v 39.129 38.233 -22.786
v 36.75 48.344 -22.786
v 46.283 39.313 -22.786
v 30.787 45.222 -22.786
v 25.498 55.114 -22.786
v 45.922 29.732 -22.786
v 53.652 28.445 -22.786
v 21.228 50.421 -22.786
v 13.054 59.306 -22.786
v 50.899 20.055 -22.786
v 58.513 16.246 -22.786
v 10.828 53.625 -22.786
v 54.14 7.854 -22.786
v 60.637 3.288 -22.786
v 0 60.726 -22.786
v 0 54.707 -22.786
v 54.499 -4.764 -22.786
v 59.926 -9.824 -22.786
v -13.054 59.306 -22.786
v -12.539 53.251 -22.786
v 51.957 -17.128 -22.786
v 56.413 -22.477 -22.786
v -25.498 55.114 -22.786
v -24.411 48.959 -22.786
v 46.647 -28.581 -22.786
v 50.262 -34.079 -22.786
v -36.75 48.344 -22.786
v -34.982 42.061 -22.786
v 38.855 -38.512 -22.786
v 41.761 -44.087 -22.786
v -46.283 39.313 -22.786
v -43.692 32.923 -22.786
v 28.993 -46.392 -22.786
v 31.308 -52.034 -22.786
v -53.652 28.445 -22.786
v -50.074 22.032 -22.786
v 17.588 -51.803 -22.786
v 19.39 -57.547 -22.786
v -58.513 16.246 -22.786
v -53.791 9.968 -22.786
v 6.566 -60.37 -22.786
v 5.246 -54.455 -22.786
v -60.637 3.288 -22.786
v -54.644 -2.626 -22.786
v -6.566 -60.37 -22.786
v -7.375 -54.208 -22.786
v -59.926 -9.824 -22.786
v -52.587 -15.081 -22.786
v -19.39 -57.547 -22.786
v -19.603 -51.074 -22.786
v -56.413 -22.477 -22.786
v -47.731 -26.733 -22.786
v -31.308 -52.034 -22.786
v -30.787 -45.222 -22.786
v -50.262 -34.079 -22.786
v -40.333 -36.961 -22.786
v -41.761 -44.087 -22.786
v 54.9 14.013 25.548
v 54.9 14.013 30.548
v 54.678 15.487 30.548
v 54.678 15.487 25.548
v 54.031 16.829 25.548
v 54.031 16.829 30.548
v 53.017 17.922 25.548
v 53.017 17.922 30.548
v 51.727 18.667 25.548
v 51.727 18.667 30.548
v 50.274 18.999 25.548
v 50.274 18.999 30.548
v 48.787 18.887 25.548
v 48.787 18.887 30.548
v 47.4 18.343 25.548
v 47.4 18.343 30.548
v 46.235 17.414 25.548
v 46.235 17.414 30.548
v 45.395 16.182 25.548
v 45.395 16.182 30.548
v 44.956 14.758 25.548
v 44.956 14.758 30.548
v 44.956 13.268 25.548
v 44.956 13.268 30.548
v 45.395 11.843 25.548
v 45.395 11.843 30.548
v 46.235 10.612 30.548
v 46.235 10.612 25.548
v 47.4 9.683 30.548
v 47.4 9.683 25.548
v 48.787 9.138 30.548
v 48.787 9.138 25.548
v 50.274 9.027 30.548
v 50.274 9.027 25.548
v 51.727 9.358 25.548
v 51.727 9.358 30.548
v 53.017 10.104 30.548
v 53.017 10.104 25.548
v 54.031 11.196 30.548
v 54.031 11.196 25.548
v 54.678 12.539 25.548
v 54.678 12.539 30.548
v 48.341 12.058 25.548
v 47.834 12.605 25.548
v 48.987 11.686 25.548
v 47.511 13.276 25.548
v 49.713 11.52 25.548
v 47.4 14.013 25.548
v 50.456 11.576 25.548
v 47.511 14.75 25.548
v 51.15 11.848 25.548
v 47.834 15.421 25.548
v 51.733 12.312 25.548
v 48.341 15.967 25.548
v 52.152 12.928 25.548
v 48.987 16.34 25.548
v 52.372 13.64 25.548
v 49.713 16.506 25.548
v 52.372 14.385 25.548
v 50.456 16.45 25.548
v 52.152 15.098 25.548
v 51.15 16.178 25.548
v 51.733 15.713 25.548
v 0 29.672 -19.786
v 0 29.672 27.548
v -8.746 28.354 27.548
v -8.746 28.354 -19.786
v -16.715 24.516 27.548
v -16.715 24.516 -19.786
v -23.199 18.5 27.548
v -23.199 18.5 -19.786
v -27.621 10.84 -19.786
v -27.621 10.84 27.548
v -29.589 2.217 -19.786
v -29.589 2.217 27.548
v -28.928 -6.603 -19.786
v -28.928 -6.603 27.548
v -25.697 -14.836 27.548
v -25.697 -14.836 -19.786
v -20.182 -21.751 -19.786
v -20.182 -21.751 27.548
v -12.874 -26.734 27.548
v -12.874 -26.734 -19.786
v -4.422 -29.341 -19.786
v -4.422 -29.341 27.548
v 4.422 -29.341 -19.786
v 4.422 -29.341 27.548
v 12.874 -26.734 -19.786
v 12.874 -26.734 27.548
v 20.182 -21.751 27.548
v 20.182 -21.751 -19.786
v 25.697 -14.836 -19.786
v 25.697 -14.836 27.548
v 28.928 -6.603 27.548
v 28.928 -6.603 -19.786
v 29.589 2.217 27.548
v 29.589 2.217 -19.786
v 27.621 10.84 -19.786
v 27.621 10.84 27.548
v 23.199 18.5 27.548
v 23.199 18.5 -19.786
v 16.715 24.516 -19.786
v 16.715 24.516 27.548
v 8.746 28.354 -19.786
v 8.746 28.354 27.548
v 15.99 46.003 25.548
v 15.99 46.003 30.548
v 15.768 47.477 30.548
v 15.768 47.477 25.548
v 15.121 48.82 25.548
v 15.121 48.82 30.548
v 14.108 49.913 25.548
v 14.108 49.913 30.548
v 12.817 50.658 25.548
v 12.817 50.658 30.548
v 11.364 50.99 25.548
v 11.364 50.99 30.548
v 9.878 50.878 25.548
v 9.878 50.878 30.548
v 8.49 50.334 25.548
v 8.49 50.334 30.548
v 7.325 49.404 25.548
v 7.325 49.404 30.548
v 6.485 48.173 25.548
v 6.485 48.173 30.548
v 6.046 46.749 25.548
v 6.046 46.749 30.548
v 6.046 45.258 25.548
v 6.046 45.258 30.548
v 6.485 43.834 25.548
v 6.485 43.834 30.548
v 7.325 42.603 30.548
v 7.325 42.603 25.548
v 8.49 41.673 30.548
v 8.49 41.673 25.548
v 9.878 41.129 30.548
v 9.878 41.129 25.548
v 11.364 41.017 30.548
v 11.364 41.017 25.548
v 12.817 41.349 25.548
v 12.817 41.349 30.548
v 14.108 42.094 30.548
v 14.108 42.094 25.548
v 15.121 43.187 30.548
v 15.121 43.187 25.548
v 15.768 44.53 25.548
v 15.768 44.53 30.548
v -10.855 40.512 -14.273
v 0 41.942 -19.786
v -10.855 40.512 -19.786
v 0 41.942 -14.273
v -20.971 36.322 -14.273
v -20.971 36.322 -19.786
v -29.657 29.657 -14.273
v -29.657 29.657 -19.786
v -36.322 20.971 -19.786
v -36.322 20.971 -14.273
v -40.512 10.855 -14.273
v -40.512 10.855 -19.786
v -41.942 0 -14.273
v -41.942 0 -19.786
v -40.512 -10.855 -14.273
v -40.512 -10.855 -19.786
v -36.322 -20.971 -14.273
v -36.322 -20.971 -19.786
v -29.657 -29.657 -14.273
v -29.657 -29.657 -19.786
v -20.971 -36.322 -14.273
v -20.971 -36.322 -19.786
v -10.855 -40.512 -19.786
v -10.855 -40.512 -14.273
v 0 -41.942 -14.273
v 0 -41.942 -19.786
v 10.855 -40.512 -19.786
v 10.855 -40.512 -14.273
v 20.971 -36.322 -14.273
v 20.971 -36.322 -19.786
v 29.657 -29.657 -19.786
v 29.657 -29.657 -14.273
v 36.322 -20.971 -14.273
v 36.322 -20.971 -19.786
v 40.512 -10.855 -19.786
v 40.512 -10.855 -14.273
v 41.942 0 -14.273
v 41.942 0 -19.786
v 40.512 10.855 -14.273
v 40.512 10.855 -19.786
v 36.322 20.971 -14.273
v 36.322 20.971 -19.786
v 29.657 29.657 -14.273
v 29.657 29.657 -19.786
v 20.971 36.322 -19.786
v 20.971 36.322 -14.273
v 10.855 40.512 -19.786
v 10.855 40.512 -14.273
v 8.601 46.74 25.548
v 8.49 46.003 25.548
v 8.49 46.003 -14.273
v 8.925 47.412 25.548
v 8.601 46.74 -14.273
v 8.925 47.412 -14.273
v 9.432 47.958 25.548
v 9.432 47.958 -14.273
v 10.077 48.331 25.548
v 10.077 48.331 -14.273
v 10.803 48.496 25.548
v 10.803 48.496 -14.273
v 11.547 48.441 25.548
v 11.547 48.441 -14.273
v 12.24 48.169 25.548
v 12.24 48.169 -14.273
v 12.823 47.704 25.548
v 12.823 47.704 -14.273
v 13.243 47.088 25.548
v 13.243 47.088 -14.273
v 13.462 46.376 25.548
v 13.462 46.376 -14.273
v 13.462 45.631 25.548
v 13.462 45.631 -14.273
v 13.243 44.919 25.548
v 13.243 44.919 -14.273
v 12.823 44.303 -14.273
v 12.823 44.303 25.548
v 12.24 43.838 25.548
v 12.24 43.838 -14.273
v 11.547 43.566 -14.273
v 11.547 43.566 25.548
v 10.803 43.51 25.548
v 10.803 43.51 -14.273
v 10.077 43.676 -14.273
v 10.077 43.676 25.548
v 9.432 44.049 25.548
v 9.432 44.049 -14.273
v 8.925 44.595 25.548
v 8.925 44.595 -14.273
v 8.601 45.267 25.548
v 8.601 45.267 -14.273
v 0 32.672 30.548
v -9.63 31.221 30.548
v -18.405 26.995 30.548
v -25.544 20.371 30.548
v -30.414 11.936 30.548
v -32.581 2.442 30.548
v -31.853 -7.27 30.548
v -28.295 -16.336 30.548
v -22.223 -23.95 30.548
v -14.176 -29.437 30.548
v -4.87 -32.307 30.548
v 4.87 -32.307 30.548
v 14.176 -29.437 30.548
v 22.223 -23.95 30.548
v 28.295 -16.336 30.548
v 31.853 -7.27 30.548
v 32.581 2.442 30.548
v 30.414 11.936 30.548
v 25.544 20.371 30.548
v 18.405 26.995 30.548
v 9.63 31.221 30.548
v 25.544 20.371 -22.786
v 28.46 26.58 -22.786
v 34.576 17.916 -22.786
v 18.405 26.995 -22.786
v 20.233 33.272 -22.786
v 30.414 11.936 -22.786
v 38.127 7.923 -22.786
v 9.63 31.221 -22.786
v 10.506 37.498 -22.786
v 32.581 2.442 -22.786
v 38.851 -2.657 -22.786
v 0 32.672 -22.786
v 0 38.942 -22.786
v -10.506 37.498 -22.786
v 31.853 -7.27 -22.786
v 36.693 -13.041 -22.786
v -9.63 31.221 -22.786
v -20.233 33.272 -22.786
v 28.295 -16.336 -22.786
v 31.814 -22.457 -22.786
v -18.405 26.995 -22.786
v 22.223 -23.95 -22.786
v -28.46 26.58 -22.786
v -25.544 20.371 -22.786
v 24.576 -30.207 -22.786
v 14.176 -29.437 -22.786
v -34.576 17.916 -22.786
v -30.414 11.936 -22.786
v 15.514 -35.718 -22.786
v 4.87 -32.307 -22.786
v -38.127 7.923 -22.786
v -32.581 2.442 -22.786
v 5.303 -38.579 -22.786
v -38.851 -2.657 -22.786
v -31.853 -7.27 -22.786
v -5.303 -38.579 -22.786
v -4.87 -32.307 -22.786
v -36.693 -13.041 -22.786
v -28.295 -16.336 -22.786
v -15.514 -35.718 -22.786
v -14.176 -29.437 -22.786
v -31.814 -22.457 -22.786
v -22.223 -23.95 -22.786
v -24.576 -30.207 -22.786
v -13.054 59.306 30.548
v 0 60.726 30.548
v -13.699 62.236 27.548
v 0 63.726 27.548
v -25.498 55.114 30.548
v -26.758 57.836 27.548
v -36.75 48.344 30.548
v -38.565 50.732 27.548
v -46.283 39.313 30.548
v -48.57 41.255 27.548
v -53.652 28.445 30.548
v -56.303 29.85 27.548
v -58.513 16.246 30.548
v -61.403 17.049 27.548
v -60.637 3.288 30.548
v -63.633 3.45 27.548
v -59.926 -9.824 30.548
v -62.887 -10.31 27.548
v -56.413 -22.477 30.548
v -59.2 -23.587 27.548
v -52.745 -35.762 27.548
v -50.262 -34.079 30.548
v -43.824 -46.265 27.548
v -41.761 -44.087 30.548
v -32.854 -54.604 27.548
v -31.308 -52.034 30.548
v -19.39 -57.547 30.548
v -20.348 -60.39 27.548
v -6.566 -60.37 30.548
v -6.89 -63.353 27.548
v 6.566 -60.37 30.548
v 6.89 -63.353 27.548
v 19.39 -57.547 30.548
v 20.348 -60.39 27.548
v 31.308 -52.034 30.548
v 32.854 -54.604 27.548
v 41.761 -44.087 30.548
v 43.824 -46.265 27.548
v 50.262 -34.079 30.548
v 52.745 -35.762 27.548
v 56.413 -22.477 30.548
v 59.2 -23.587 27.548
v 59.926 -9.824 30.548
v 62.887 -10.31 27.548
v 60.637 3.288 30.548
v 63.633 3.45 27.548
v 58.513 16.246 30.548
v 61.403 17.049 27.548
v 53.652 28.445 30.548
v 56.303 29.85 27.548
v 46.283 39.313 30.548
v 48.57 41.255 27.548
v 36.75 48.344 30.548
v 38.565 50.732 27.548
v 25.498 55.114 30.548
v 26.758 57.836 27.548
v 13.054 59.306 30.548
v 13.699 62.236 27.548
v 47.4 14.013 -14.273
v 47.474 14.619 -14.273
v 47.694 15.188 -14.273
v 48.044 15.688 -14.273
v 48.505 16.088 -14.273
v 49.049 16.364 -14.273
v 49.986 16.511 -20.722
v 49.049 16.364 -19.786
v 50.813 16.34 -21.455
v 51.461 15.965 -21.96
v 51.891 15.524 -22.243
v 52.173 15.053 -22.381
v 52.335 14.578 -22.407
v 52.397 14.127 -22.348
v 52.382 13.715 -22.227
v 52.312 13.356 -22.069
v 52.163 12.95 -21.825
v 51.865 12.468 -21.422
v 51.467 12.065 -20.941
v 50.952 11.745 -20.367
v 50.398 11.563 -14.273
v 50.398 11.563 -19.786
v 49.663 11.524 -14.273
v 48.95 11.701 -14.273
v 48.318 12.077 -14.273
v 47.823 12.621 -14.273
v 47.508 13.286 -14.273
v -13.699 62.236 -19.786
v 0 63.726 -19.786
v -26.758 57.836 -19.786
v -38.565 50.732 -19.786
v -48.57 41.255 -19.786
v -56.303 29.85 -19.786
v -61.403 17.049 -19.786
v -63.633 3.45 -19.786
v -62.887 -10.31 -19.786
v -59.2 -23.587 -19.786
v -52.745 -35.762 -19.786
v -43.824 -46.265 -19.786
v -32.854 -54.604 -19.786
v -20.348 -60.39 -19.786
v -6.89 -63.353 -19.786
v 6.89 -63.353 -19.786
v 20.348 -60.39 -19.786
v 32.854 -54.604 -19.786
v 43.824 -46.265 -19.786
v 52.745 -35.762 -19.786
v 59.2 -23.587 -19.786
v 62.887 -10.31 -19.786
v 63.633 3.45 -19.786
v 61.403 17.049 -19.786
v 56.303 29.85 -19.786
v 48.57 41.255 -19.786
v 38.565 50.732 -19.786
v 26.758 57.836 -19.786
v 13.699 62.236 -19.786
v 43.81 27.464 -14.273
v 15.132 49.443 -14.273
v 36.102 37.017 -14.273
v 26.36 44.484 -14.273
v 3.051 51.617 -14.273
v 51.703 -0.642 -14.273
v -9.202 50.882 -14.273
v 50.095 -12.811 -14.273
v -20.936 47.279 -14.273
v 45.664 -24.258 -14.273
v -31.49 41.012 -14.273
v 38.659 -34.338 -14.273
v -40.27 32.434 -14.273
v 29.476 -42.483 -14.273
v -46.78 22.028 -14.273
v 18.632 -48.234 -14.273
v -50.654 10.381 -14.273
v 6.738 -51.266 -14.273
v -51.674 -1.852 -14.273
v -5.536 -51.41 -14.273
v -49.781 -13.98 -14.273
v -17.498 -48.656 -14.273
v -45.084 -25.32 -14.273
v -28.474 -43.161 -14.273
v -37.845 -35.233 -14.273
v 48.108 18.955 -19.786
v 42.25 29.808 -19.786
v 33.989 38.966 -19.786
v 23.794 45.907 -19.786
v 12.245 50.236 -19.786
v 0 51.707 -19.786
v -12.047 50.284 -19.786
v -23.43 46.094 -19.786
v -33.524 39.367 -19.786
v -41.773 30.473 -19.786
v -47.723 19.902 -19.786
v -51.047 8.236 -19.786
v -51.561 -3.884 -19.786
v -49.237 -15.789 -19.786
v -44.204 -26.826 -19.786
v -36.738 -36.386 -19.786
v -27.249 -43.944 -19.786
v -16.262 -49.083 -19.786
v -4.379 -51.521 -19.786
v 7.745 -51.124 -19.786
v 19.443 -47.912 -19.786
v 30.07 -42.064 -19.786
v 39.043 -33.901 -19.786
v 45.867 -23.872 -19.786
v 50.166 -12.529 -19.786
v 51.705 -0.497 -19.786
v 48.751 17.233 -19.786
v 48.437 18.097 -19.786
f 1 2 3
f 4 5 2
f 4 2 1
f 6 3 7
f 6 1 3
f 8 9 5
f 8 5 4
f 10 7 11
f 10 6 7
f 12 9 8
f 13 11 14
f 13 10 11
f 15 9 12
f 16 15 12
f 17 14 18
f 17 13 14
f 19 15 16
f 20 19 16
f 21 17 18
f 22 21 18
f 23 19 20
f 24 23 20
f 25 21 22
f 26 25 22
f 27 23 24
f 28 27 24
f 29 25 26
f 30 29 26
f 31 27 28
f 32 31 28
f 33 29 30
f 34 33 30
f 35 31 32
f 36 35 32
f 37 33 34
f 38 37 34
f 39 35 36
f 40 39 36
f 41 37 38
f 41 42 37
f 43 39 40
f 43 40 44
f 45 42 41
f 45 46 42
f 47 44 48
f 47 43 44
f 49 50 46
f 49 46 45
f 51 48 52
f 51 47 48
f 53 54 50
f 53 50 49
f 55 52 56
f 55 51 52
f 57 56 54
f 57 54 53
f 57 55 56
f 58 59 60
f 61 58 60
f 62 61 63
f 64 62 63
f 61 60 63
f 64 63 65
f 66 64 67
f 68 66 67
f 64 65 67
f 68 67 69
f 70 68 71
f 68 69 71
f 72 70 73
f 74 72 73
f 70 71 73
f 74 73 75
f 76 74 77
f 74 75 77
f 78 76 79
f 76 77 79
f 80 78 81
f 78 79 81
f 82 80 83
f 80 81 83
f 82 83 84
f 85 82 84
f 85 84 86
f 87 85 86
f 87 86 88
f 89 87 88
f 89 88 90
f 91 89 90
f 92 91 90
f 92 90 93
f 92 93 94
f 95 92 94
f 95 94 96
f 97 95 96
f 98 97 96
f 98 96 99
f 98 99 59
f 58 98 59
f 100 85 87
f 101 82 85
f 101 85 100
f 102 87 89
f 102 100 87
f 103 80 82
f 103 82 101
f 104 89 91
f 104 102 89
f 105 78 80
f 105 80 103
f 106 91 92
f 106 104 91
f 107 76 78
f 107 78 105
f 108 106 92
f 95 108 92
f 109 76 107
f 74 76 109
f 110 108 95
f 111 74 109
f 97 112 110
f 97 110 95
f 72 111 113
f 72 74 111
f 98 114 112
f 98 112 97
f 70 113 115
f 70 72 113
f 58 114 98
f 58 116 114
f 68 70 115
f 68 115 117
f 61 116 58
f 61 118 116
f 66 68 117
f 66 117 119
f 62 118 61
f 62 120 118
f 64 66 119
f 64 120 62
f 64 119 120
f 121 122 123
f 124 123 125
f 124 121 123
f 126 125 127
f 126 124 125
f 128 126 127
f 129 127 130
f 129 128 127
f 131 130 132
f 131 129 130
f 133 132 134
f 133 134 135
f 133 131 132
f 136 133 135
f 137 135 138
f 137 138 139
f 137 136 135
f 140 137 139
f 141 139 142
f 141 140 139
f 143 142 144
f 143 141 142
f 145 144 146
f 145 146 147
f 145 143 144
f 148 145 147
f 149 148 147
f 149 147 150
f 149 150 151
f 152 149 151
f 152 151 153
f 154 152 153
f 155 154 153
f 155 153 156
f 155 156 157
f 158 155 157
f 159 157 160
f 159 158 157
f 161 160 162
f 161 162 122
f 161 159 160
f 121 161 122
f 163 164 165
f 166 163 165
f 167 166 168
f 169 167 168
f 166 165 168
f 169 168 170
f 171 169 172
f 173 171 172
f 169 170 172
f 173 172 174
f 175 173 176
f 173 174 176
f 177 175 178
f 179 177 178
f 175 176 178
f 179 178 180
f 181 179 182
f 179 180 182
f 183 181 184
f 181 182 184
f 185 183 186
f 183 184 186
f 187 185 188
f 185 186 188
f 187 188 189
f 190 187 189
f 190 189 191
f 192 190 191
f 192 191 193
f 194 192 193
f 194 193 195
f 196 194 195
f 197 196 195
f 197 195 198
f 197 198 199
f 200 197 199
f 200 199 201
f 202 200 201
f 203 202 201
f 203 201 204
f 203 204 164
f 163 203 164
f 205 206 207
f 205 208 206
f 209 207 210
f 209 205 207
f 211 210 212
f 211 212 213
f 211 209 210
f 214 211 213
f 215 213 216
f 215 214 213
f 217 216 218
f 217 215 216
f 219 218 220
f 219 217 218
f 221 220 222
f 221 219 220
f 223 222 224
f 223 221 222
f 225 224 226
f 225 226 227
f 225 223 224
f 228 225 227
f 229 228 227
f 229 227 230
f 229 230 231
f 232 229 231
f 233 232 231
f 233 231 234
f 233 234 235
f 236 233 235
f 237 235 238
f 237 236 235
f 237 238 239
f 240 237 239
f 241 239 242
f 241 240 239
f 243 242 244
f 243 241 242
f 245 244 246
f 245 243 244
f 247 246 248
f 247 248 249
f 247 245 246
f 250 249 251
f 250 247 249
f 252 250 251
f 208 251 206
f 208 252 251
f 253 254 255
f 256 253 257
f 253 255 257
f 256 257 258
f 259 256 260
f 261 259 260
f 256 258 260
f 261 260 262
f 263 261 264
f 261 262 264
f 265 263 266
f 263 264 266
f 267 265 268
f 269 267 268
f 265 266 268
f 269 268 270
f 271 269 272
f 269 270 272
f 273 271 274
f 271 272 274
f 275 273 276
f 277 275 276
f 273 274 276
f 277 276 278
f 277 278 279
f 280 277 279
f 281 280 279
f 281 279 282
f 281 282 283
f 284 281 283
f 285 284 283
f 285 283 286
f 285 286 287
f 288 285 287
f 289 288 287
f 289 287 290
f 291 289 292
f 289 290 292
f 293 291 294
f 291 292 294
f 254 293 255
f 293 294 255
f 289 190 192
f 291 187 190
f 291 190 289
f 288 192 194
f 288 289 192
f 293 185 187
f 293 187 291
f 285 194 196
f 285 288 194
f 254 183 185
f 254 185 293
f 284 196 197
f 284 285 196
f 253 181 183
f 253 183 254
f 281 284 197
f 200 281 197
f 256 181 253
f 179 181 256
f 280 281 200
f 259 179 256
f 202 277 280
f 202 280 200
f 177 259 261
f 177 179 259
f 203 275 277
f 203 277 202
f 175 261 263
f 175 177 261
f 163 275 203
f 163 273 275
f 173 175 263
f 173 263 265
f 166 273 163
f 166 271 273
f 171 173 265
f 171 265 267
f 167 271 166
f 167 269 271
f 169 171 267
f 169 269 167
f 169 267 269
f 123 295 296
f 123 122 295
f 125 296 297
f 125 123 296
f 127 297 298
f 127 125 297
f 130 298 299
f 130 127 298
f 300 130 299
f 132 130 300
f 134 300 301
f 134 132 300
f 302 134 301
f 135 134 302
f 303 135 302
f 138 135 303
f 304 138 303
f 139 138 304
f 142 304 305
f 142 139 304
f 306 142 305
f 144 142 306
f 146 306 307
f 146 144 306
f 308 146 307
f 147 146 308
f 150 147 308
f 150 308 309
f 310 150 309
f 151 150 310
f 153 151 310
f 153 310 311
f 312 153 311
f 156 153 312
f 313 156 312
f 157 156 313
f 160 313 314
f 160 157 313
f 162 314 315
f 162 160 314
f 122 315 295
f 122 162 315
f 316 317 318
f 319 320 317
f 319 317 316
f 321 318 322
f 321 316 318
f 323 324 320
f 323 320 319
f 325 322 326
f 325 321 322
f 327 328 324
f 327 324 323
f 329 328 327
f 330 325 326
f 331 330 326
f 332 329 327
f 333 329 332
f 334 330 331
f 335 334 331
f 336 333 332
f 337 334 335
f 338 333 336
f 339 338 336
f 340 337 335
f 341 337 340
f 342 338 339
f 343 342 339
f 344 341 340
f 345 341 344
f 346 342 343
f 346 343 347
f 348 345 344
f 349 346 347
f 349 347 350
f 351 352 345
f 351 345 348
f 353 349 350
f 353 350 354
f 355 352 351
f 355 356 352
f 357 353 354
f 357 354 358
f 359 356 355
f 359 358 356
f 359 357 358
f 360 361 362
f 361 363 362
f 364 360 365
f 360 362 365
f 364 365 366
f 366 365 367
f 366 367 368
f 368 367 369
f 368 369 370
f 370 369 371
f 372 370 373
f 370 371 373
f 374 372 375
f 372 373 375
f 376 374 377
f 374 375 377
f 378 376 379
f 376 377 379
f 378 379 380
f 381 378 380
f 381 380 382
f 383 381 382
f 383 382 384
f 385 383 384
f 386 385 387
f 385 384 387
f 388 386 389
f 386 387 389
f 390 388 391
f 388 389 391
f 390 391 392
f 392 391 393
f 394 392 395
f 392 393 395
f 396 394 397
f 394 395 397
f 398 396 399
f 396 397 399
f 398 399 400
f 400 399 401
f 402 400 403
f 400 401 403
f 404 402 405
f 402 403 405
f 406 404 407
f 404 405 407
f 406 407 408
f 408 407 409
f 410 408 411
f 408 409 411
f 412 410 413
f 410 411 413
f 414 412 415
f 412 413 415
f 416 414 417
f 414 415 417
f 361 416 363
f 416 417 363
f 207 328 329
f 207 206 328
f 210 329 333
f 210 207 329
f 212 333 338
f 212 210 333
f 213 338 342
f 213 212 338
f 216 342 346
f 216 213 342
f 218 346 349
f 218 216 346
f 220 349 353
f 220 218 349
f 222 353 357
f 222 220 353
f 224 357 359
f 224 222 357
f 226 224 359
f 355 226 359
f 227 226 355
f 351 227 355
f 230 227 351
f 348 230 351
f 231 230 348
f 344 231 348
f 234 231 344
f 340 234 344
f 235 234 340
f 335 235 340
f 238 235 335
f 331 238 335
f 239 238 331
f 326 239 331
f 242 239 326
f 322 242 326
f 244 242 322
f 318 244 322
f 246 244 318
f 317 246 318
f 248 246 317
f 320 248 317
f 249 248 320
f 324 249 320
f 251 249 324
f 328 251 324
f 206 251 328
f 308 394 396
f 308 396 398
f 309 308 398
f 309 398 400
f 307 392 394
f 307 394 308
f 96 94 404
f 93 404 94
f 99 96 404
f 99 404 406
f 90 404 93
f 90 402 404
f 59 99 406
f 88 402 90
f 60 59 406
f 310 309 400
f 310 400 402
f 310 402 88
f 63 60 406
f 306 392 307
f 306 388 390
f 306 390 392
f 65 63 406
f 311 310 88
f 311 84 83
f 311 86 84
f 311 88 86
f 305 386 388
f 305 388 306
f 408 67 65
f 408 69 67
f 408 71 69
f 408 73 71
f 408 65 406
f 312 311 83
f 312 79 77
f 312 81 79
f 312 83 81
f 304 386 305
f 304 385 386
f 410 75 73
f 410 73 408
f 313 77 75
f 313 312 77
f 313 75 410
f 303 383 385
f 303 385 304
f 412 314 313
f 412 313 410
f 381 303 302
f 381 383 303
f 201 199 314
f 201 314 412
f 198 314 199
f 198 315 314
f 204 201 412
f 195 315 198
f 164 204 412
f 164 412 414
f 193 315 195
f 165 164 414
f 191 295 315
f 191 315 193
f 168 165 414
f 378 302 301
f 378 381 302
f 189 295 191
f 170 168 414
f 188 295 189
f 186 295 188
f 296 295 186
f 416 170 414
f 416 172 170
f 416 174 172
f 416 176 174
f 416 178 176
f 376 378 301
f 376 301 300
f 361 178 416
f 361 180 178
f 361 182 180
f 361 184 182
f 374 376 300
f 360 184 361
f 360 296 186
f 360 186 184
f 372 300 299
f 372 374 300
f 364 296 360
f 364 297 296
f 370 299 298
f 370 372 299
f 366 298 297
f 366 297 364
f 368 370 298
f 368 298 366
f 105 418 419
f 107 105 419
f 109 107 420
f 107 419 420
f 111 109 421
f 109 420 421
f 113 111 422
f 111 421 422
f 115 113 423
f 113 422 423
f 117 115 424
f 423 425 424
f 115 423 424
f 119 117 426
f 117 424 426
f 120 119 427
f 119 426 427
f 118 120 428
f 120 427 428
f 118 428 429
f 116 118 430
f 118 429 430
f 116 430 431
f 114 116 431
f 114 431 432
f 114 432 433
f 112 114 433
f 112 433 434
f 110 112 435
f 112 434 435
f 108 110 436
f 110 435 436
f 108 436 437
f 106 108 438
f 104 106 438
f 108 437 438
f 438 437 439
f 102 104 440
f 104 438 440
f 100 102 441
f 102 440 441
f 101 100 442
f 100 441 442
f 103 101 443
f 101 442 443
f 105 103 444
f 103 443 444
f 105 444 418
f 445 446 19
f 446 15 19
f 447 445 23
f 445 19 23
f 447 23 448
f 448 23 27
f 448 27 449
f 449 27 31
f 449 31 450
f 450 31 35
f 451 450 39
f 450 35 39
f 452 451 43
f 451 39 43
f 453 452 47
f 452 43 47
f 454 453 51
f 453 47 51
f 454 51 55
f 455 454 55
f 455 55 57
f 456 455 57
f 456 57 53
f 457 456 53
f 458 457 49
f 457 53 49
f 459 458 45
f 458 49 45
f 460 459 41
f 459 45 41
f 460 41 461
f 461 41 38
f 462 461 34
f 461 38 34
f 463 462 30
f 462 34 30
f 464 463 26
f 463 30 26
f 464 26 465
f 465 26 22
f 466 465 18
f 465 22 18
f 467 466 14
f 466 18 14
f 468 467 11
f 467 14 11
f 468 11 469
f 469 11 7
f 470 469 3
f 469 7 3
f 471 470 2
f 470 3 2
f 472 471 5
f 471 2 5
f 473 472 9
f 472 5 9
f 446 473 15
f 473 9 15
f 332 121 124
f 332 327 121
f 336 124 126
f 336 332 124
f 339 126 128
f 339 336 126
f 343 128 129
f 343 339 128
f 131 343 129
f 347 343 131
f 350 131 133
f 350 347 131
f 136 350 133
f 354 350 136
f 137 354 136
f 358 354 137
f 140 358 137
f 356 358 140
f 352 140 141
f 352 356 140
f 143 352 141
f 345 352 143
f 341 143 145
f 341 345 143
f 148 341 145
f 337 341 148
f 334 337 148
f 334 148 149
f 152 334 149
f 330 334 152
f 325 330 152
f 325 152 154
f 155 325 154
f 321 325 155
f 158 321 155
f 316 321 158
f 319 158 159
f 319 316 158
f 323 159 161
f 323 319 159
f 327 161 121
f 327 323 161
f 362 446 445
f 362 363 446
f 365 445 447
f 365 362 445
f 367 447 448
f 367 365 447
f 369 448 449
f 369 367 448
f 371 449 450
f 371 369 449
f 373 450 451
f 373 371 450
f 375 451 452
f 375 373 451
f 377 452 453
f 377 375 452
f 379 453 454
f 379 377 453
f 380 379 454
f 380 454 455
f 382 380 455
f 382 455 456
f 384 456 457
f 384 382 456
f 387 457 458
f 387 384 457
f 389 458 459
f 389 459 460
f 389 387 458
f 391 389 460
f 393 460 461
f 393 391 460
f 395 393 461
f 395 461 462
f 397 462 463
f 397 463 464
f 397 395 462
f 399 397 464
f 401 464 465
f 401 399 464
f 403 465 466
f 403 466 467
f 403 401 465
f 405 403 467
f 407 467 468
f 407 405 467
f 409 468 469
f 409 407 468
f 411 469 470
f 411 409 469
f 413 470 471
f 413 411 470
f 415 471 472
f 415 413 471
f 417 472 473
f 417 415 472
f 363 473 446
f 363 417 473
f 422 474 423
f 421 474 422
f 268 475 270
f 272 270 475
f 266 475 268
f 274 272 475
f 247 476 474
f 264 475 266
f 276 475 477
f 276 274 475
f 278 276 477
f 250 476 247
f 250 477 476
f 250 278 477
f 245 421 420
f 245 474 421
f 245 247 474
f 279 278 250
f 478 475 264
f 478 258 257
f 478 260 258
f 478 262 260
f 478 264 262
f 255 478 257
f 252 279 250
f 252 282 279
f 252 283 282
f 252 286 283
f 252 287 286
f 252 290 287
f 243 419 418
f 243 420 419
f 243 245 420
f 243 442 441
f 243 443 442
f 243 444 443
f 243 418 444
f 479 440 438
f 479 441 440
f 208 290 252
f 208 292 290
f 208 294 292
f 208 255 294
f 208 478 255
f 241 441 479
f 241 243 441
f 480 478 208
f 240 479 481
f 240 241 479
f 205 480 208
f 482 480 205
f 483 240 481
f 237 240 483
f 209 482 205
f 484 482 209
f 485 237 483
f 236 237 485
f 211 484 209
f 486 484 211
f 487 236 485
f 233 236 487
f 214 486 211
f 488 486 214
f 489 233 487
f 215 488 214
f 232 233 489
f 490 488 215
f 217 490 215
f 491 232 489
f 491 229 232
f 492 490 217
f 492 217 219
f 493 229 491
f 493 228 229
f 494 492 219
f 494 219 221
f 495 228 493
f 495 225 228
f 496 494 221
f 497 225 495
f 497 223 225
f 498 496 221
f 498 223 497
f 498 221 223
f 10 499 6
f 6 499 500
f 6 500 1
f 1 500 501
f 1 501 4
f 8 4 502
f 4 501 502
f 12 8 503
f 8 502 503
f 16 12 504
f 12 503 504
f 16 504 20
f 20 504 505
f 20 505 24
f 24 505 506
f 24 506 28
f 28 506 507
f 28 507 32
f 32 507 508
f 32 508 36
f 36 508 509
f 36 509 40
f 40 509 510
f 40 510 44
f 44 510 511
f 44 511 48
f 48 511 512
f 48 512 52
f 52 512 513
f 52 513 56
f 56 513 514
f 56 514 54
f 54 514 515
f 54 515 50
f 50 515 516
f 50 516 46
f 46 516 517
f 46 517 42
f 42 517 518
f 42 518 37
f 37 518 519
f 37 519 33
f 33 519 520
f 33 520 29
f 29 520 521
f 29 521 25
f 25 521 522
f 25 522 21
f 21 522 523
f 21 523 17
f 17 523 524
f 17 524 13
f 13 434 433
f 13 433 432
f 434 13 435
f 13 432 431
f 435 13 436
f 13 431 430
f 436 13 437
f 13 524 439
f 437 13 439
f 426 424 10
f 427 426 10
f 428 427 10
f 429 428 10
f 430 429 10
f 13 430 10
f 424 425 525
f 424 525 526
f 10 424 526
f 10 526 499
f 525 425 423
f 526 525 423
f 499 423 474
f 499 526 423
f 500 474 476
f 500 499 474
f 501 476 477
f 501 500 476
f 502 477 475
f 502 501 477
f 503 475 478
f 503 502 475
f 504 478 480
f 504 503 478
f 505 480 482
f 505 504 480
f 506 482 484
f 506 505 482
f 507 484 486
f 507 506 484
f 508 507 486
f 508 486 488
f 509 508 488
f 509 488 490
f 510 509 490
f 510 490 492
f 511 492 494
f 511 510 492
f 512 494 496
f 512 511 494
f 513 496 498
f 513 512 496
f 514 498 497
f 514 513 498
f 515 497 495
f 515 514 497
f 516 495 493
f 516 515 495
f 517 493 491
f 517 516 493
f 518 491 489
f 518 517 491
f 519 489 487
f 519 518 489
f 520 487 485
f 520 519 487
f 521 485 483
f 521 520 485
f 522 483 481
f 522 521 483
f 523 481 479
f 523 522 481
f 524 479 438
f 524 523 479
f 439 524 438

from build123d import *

# Parameters (mm, degrees)
F3_D           = 5
F3_CBORE_D     = 10
F3_CBORE_DEPTH = 5
F4_T6_ANGLE    = 291.5048547237
F4_T14_ANGLE   = 80.1015252238


# Not quite as in the source:
# - a fillet or chamfer that OpenCascade refuses, or shapes differently, is made with other operations: its cross-section is extruded or revolved along the edge and cut away or added


with BuildPart() as f1:
    # F0 (on Right) → F1 (revolve)
    with BuildSketch(Plane.YZ):
        Polygon((63.7261494994, 30.5484924465), (29.6720992774, 30.5484924465), (29.6720992774, -22.7861702442), (41.941575706, -22.7861702442), (41.941575706, -14.2726562917), (51.7070740461, -14.2726562917), (51.7070740461, -22.7861702442), (63.7261494994, -22.7861702442), align=None)
    revolve(axis=Axis((0, 0, 14.0182273462), (0, 0, 1)))

    # F3 (through all)
    with Locations(Plane.XY.offset(30.5484924465)):
        with Locations((10.9902555123, 46.0034860298), (49.8999916017, 14.0128545463)):
            CounterBoreHole(F3_D / 2, F3_CBORE_D / 2, F3_CBORE_DEPTH)

    # F4: chamfer of 3 on 7 edges, made by hand

    # F4_s1 → F4_t2 (revolve, cut)
    with BuildSketch(Plane.YZ):
        Polygon((60.7261494994, 30.5484924465), (63.7261494994, 27.5484924465), (63.7261494994, 30.5484924465), align=None)
    revolve(axis=Axis((0, 0, 30.5484924465), (0, 0, 1)), mode=Mode.SUBTRACT)

    # F4_s3 → F4_t4 (revolve, cut)
    with BuildSketch(Plane.YZ):
        Polygon((63.7261494994, -19.7861702442), (60.7261494994, -22.7861702442), (63.7261494994, -22.7861702442), align=None)
    revolve(axis=Axis((0, 0, -22.7861702442), (0, 0, 1)), mode=Mode.SUBTRACT)

    # F4_s5 → F4_t6 (revolve, cut)
    with BuildSketch(Plane.YZ):
        Polygon((54.7070740461, -22.7861702442), (51.7070740461, -19.7861702442), (51.7070740461, -22.7861702442), align=None)
    revolve(axis=Axis((0, 0, -22.7861702442), (0, 0, 1)), revolution_arc=F4_T6_ANGLE, mode=Mode.SUBTRACT)

    # F4_s7 → F4_t8 (revolve, cut)
    with BuildSketch(Plane.YZ):
        Polygon((38.941575706, -22.7861702442), (41.941575706, -19.7861702442), (41.941575706, -22.7861702442), align=None)
    revolve(axis=Axis((0, 0, -22.7861702442), (0, 0, 1)), mode=Mode.SUBTRACT)

    # F4_s9 → F4_t10 (revolve, cut)
    with BuildSketch(Plane.YZ):
        Polygon((29.6720992774, -19.7861702442), (32.6720992774, -22.7861702442), (29.6720992774, -22.7861702442), align=None)
    revolve(axis=Axis((0, 0, -22.7861702442), (0, 0, 1)), mode=Mode.SUBTRACT)

    # F4_s11 → F4_t12 (revolve, cut)
    with BuildSketch(Plane.YZ):
        Polygon((32.6720992774, 30.5484924465), (29.6720992774, 27.5484924465), (29.6720992774, 30.5484924465), align=None)
    revolve(axis=Axis((0, 0, 30.5484924465), (0, 0, 1)), mode=Mode.SUBTRACT)

    # F4_s13 → F4_t14 (revolve, cut)
    with BuildSketch(Plane(origin=(0, 0, 0), x_dir=(0, 0, 1), z_dir=(0.1719028764, -0.9851139026, 0))):
        Polygon((-22.7861702442, -54.7070740461), (-19.7861702442, -51.7070740461), (-22.7861702442, -51.7070740461), align=None)
    revolve(axis=Axis((0, 0, -22.7861702442), (0, 0, 1)), revolution_arc=F4_T14_ANGLE, mode=Mode.SUBTRACT)


solid = f1.part
